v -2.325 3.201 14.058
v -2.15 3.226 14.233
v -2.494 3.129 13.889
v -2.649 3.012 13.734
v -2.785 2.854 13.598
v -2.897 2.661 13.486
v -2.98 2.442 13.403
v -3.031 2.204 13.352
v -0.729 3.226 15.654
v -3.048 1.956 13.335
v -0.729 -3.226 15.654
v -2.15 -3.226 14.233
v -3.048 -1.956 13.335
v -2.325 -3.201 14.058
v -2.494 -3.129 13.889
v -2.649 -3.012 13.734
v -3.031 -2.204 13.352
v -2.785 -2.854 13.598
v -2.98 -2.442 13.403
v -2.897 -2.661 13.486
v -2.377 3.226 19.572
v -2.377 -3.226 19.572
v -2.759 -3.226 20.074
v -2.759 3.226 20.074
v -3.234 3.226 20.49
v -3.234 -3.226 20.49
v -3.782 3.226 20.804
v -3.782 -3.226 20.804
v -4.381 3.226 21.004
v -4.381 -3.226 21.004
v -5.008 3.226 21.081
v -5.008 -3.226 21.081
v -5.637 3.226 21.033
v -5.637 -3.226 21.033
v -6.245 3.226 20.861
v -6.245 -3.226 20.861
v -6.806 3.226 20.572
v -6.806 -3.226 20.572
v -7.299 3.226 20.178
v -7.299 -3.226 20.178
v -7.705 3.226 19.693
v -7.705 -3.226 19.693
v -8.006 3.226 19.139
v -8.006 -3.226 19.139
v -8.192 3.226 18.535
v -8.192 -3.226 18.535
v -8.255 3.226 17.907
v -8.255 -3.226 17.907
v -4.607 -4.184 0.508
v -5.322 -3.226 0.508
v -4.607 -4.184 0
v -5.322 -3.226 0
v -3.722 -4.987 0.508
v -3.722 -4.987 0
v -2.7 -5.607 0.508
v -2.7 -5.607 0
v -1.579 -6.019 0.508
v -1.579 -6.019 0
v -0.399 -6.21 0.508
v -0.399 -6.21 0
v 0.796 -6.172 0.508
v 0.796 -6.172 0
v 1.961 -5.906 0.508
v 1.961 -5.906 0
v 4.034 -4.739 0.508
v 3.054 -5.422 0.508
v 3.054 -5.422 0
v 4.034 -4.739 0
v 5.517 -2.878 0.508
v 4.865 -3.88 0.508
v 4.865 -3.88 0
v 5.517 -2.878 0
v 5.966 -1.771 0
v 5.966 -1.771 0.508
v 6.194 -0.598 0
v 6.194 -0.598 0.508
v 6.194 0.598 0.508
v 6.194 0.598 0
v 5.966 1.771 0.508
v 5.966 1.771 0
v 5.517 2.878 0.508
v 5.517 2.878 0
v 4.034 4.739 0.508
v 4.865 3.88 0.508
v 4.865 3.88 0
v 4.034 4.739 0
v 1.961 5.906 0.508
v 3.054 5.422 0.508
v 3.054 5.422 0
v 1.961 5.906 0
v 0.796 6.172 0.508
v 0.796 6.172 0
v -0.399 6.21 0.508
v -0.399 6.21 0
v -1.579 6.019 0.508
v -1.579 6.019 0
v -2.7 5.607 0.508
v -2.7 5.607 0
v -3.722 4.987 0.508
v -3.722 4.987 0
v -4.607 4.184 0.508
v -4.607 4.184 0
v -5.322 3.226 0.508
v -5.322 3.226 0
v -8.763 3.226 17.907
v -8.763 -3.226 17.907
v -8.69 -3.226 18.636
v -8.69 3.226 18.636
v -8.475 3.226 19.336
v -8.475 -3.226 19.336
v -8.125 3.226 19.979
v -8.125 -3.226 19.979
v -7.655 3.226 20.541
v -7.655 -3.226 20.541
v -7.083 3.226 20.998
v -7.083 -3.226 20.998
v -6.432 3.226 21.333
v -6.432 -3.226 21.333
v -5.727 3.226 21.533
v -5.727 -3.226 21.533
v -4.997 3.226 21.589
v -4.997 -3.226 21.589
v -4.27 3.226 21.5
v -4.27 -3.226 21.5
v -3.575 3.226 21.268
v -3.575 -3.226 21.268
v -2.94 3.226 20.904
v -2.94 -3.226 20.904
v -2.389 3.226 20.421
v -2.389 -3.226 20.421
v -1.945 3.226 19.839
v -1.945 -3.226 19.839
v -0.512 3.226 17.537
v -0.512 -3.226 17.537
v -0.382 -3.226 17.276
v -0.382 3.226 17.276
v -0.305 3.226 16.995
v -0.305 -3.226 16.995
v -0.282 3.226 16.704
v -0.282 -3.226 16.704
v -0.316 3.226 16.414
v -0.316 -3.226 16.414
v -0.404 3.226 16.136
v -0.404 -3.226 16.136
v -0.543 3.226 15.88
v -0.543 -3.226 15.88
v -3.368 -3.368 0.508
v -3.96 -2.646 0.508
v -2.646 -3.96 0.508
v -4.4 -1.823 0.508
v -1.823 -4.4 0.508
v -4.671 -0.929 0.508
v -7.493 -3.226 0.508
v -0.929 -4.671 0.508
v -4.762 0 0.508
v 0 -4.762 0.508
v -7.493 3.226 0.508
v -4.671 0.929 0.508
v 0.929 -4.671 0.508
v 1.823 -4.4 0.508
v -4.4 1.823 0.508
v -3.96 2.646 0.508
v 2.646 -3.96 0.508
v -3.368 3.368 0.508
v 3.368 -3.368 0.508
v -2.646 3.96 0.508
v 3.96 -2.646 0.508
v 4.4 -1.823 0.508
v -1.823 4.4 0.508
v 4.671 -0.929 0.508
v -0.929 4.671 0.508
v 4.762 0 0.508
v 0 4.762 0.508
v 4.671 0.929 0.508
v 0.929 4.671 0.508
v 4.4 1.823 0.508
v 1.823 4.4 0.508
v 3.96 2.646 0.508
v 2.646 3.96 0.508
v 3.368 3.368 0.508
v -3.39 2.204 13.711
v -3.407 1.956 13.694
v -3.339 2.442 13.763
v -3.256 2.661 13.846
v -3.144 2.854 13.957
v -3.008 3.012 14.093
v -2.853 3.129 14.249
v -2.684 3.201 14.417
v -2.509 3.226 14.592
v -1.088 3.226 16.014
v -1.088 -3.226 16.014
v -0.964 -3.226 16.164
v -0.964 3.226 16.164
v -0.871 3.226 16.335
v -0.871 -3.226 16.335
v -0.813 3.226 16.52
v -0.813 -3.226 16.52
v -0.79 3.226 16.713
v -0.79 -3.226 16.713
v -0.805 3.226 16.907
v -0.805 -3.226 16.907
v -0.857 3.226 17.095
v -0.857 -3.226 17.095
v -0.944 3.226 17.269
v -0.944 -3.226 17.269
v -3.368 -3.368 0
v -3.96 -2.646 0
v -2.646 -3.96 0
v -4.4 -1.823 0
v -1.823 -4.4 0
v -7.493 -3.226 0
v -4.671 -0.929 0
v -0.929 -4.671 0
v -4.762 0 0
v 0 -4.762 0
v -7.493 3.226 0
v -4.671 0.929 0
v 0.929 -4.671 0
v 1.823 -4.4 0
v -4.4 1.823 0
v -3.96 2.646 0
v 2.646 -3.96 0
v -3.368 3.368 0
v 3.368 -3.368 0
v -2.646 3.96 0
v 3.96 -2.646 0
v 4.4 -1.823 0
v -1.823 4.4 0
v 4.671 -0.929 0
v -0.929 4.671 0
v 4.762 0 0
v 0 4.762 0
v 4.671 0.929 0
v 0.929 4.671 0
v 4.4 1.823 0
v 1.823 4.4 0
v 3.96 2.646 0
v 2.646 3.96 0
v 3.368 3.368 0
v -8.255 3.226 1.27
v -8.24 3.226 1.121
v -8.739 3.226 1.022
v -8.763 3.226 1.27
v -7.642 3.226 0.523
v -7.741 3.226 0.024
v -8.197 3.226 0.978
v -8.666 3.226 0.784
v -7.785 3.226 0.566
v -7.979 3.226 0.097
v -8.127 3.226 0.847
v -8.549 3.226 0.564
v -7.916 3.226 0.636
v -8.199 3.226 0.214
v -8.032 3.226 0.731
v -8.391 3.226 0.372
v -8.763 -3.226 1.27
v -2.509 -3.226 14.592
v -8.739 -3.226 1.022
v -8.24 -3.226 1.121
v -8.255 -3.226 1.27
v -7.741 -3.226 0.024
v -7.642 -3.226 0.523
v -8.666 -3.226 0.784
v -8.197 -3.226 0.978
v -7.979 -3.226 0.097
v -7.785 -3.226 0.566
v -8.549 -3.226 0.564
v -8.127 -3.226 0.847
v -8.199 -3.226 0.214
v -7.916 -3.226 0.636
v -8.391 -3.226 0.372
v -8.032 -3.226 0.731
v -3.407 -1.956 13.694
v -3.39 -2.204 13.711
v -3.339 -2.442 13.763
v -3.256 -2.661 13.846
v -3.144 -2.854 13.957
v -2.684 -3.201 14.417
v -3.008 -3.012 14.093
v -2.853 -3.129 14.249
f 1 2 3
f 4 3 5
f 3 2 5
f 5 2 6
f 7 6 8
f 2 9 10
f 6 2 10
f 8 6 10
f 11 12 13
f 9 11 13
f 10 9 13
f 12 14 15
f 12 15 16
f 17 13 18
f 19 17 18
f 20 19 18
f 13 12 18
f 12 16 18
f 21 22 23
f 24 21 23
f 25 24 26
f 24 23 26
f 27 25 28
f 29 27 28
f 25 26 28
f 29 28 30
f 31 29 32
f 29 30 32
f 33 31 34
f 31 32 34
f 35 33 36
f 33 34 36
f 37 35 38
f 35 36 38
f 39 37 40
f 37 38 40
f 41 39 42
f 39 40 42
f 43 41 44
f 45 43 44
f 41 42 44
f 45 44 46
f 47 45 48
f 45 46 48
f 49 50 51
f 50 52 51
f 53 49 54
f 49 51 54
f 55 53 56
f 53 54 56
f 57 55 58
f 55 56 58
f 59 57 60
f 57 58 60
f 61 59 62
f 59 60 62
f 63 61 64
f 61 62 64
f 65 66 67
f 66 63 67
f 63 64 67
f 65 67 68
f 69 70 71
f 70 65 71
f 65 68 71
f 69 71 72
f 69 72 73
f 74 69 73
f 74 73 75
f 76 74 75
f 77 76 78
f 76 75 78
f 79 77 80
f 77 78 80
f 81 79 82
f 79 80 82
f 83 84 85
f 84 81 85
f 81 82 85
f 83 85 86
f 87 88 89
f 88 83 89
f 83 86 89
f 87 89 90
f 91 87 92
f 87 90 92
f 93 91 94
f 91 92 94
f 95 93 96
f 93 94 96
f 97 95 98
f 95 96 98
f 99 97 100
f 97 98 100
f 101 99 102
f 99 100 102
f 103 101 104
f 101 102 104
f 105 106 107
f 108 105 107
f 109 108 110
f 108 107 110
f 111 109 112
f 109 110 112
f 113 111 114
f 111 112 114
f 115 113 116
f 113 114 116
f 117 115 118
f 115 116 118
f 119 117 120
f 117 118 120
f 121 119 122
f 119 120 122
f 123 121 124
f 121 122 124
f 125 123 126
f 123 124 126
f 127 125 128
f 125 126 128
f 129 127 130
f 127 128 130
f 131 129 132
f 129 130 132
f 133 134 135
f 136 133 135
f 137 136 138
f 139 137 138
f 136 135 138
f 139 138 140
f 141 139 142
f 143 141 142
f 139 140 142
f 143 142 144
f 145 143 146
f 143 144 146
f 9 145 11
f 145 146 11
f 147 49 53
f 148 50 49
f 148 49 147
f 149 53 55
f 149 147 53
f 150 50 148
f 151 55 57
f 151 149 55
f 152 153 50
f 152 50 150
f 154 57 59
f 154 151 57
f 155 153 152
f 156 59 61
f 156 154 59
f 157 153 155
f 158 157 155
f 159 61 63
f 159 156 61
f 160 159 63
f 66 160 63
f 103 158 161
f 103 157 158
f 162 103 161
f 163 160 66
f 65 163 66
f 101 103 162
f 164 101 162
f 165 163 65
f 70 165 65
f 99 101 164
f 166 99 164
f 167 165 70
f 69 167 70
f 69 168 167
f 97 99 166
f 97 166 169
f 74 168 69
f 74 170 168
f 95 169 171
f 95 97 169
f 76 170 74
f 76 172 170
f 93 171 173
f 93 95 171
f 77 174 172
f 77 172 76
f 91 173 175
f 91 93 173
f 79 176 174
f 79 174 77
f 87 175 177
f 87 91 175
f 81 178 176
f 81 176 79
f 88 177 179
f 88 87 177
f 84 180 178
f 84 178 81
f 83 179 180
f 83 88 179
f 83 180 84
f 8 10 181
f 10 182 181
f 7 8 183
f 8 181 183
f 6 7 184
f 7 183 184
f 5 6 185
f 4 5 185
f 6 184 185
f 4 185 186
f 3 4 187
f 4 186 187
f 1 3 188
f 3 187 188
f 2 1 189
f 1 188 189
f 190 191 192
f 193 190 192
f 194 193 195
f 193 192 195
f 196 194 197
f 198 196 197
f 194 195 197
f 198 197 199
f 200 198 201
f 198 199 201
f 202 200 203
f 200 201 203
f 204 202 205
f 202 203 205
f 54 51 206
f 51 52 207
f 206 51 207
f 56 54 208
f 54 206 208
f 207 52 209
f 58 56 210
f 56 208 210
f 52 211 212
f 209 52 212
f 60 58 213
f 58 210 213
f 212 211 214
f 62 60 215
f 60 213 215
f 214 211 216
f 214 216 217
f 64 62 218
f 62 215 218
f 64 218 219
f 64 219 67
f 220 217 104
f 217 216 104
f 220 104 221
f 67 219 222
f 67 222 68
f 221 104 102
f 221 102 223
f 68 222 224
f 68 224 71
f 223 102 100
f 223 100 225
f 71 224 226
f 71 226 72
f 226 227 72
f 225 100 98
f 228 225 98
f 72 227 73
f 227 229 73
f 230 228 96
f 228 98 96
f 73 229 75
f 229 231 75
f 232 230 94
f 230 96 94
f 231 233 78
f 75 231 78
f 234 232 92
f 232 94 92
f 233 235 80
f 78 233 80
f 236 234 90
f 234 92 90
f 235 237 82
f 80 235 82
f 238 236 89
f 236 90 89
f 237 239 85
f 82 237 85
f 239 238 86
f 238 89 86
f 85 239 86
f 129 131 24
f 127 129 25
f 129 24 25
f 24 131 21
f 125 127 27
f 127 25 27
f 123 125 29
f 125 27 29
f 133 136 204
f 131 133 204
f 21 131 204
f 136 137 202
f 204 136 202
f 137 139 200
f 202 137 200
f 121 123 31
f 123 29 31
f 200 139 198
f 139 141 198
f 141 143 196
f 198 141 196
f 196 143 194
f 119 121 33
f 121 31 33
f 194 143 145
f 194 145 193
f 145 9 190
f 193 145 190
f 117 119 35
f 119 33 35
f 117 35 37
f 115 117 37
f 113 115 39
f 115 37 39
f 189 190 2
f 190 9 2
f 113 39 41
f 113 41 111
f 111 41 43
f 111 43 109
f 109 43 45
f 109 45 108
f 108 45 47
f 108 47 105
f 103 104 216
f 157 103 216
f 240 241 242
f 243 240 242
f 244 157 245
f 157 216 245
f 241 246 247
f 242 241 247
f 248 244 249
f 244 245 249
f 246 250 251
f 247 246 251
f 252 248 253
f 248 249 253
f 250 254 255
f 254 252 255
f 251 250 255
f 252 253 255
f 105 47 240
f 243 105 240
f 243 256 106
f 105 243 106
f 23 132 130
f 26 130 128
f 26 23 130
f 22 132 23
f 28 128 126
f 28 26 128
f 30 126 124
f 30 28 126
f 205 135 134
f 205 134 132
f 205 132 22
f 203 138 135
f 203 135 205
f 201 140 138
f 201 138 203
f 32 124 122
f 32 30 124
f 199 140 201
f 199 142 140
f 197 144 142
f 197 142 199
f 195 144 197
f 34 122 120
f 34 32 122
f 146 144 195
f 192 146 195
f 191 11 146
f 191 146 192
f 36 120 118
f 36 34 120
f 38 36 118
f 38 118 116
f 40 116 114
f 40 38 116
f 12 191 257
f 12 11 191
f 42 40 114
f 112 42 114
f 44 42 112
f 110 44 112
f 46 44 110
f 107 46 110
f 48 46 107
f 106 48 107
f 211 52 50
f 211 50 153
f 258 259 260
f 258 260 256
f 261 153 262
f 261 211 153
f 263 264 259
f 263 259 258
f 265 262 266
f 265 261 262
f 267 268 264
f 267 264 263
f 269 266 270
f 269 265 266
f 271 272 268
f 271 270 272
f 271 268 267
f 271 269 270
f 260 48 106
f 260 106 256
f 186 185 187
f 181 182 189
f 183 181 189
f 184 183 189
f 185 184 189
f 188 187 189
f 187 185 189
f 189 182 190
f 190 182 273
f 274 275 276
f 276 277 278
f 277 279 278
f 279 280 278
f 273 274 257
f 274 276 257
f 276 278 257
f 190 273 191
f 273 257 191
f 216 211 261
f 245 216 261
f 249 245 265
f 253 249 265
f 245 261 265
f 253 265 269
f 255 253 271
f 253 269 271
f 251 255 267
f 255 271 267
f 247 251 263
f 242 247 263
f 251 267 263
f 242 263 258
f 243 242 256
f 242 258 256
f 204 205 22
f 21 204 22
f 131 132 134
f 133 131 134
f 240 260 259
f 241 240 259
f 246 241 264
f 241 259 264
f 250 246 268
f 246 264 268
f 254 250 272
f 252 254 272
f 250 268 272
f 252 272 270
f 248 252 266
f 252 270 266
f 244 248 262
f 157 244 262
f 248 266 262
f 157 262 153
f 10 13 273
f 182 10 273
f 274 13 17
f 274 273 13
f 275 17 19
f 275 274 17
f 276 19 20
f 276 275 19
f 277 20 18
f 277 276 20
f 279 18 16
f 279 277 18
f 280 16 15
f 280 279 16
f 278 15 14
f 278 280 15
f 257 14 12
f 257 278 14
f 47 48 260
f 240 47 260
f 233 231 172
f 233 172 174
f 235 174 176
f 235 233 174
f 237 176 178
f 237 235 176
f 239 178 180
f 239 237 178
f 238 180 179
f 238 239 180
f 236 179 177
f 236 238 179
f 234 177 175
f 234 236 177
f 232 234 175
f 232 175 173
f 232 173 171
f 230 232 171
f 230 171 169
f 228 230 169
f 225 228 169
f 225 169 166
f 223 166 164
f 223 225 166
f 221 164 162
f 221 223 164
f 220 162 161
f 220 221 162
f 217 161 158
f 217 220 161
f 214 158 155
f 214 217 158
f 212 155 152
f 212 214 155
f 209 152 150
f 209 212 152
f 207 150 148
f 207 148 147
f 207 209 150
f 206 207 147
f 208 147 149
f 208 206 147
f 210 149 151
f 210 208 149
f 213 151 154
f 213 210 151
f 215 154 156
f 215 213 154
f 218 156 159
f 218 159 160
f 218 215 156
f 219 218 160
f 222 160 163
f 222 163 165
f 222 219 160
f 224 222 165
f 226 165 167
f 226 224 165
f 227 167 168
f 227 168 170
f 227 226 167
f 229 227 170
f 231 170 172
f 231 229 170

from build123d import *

# Parameters (mm, degrees)
SKETCH1_R           = 6.223
SKETCH1_R_2         = 4.7625
EXTRUDE1_DEPTH      = 0.508
EXTRUDE2_DEPTH      = 3.2258
EXTRUDE2_DEPTH_BACK = 3.2258
SKETCH3_W           = 0.901351443
SKETCH3_H           = 6.4516
EXTRUDE3_DEPTH      = 0.508
FILLET1_R           = 1.27


with BuildPart() as part:
    # Sketch1 → Extrude1 (new body)
    with BuildSketch(Plane.XY):
        Circle(SKETCH1_R)
        Circle(SKETCH1_R_2, mode=Mode.SUBTRACT)
    extrude(amount=EXTRUDE1_DEPTH)



with BuildPart() as body_2:
    # Sketch2 → Extrude2 (new, two sides: drawn at the far end of the back side and taken through both)
    with BuildSketch(Plane(origin=(0, 0, 0), x_dir=(1, 0, 0), z_dir=(0, 1, 0)).offset(-EXTRUDE2_DEPTH_BACK)):
        with BuildLine():
            Line((-6.223, 0), (-7.493, 0))
            ThreePointArc((-7.493, 0), (-8.391025612, -0.371974388), (-8.763, -1.27))
            Line((-8.763, -1.27), (-8.763, -17.907))
            ThreePointArc((-8.763, -17.907), (-6.08420147, -21.450454304), (-1.94460825, -19.839306284))
            Line((-1.94460825, -19.839306284), (-0.512193665, -17.537255749))
            ThreePointArc((-0.512193665, -17.537255749), (-0.292109819, -16.558154348), (-0.728518239, -15.654481761))
            Line((-0.728518239, -15.654481761), (-3.048, -13.335))
            Line((-3.048, -13.335), (-3.407210245, -13.694210245))
            Line((-3.407210245, -13.694210245), (-1.087728484, -16.013692006))
            ThreePointArc((-1.087728484, -16.013692006), (-0.796789537, -16.616140397), (-0.943512101, -17.268874664))
            Line((-0.943512101, -17.268874664), (-2.376524764, -19.571886378))
            ThreePointArc((-2.376524764, -19.571886378), (-5.945185277, -20.961845239), (-8.255, -17.907))
            Line((-8.255, -17.907), (-8.255, -1.27))
            ThreePointArc((-8.255, -1.27), (-8.031815367, -0.731184633), (-7.493, -0.508))
            Line((-7.493, -0.508), (-6.223, -0.508))
            Line((-6.223, -0.508), (-6.223, 0))
        make_face()
    extrude(amount=EXTRUDE2_DEPTH + EXTRUDE2_DEPTH_BACK)


with BuildPart() as part_1:
    add(part.part)

    add(body_2.part)  # Extrude3 merges body 2
    # Sketch3 → Extrude3 (add)
    with BuildSketch(Plane(origin=(0, 0, 0), x_dir=(-1, 0, 0), z_dir=(0, 0, -1))):
        with Locations((5.772324279, 0)):
            Rectangle(SKETCH3_W, SKETCH3_H)
    extrude(amount=-EXTRUDE3_DEPTH)

    # Fillet1
    fillet1_edges = [part_1.edges().sort_by_distance(p)[0] for p in [
        (-3.227605122, -3.2258, 13.514605122),
        (-3.227605122, 3.2258, 13.514605122),
    ]]
    fillet(fillet1_edges, radius=FILLET1_R)


solid = part_1.part
